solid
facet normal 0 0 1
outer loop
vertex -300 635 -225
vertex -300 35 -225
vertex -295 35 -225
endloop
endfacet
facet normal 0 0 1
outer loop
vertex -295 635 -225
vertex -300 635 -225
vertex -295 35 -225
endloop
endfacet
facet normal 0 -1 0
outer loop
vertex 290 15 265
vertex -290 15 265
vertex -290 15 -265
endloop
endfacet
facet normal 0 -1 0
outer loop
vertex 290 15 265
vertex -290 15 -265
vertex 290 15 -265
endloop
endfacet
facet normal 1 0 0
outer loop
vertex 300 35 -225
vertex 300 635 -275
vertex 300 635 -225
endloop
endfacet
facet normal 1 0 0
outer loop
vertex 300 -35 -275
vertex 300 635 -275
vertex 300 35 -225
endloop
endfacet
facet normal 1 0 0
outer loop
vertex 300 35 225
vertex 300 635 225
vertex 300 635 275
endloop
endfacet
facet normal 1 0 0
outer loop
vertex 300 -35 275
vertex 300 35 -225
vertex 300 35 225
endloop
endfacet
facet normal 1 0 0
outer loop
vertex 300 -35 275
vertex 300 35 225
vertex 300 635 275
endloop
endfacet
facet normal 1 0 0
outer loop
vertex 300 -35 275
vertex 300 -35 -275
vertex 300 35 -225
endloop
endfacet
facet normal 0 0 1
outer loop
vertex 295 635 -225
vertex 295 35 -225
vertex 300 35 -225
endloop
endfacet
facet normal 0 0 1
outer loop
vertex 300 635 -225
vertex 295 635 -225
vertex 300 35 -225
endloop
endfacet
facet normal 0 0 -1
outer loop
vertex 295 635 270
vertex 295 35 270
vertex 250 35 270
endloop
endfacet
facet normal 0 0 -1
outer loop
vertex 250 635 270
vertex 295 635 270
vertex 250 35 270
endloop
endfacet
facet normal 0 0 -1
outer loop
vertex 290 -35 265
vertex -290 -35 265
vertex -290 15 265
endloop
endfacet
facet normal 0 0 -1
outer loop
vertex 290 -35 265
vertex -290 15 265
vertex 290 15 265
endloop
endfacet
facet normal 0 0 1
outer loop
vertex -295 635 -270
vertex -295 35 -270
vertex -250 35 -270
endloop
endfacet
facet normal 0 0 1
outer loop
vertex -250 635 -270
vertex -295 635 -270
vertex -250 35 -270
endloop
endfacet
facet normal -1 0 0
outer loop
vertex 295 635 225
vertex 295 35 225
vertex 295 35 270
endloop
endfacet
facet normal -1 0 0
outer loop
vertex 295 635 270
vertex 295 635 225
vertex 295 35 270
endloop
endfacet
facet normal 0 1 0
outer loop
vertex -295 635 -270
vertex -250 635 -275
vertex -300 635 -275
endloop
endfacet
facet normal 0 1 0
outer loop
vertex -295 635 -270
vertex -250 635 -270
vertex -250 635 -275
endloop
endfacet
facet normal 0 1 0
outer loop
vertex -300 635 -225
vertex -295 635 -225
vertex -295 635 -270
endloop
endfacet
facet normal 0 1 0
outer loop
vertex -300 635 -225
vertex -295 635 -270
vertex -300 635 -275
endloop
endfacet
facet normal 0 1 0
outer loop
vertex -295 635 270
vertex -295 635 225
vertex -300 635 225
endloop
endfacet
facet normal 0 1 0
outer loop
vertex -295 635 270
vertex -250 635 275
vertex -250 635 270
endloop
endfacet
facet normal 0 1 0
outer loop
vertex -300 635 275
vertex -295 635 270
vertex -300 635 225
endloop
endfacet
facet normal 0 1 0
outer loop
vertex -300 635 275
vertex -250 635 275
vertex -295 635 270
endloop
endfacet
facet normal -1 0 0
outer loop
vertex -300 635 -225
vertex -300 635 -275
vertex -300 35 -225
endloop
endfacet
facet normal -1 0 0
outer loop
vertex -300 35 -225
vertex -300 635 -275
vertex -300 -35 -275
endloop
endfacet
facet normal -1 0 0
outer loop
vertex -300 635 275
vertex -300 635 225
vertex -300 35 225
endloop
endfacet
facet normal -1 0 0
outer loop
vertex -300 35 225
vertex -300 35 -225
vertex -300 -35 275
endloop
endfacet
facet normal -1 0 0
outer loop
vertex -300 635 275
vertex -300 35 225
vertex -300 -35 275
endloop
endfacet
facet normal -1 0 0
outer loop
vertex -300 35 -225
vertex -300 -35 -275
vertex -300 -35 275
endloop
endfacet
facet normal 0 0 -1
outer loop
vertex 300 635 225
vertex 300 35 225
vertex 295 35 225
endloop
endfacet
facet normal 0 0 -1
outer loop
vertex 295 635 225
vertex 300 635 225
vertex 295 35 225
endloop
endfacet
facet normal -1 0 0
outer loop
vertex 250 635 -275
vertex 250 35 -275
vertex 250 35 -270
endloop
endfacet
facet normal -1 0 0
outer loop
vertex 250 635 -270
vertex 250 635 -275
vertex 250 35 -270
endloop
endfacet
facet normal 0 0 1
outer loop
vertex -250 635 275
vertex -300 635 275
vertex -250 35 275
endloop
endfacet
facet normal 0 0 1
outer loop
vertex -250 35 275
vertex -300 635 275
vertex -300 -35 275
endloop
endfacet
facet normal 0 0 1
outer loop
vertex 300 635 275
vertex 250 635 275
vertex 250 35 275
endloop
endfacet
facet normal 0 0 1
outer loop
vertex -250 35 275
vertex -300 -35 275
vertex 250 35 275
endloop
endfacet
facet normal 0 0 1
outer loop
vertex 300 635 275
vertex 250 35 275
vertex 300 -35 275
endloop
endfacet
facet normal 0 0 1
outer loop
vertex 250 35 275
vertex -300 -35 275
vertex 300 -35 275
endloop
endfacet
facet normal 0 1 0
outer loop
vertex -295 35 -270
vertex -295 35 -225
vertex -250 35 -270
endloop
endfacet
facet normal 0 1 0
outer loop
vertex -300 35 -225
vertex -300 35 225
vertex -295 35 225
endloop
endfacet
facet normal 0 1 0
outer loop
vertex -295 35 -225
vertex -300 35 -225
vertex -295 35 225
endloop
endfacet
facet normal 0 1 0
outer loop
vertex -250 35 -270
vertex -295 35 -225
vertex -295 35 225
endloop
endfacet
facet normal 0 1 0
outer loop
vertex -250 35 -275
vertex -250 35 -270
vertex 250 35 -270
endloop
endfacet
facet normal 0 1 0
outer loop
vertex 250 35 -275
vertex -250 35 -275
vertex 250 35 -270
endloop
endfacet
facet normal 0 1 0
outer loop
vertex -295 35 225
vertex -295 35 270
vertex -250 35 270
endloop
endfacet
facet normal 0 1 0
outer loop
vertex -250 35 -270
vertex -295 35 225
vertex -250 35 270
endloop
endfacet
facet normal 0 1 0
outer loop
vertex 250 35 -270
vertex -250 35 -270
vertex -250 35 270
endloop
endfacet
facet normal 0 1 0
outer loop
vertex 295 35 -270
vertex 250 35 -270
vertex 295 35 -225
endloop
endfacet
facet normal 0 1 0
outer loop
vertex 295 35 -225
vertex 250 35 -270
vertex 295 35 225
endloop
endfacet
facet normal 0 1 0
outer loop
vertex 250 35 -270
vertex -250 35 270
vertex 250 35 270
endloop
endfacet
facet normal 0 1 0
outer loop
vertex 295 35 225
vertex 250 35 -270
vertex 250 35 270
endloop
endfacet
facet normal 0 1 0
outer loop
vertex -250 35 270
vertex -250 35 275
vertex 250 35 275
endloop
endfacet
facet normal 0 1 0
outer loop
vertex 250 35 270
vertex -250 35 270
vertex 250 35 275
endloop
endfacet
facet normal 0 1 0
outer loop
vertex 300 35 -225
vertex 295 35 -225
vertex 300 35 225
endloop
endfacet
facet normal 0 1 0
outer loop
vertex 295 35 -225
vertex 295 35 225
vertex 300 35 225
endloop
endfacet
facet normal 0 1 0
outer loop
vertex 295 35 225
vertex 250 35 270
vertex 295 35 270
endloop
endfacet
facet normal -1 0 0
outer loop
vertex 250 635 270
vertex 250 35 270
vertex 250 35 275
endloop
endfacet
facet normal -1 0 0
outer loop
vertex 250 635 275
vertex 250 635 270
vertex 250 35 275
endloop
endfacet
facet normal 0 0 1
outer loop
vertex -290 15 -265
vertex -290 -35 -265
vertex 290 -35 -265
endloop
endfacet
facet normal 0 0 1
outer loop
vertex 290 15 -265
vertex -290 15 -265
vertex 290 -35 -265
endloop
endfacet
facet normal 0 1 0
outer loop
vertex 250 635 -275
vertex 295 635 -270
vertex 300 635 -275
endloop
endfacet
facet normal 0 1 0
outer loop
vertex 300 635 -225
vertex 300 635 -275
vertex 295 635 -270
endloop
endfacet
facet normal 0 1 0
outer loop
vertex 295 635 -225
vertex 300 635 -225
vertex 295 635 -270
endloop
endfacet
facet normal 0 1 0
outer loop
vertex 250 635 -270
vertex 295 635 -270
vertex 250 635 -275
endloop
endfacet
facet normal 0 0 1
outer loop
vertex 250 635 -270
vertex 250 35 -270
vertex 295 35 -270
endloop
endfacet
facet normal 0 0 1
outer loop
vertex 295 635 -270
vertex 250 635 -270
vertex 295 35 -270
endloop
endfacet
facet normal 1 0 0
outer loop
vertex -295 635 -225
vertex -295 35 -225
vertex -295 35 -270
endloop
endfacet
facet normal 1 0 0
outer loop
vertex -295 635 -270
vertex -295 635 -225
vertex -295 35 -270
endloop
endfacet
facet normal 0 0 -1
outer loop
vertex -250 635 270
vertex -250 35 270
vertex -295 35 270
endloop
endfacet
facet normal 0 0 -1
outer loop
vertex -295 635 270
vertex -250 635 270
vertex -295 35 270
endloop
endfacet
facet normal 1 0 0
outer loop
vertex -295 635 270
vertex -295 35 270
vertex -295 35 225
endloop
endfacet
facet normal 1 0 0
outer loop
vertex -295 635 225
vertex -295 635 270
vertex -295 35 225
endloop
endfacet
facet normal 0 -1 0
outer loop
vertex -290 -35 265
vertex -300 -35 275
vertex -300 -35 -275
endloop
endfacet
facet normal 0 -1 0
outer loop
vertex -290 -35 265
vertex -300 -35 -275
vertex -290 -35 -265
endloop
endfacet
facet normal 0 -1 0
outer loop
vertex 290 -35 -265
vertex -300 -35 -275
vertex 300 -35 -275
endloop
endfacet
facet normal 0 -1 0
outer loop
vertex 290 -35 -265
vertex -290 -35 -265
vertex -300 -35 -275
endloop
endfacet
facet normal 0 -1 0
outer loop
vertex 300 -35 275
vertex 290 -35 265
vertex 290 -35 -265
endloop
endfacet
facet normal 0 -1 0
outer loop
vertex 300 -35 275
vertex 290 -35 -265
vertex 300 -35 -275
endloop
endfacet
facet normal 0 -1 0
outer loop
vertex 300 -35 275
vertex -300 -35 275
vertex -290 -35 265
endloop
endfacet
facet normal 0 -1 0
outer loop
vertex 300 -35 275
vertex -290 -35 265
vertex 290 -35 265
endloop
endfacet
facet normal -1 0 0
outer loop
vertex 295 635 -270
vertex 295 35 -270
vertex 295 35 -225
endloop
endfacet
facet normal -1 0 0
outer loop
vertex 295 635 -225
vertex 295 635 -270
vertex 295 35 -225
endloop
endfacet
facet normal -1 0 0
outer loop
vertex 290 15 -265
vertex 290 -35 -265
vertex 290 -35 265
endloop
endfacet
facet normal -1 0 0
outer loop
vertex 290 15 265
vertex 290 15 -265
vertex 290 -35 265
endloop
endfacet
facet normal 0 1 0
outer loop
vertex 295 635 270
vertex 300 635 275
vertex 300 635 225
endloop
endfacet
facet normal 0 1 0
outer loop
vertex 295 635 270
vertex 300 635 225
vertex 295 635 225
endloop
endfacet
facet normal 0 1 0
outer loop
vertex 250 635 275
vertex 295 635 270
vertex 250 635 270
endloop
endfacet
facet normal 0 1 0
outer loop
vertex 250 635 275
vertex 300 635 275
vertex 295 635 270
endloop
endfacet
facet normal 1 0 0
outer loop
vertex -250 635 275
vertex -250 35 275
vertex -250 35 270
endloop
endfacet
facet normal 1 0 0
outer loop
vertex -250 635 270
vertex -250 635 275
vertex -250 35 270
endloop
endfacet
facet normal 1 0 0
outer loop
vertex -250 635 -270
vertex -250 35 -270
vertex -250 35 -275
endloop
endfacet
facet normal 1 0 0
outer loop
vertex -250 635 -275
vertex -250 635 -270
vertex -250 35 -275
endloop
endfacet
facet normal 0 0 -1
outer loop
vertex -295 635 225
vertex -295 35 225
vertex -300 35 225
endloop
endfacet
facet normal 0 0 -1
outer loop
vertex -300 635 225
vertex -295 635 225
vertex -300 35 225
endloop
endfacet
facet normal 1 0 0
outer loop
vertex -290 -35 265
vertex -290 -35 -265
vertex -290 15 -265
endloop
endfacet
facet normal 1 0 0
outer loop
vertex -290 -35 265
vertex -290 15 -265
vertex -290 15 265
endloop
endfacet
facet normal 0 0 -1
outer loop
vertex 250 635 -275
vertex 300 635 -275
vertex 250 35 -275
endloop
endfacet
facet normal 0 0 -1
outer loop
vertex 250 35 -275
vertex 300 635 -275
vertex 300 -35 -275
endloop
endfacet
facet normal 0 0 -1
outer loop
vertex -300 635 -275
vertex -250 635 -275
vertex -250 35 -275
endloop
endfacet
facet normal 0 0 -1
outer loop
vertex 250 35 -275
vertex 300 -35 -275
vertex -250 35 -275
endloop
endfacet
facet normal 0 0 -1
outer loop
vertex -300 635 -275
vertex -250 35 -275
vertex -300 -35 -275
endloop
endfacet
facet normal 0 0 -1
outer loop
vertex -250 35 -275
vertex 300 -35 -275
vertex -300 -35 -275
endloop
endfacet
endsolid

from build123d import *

# Parameters (mm, degrees)
F0_W     = 600
F0_H     = 550
F1_DEPTH = 35
F3_DEPTH = 600
F4_W     = 580
F4_H     = 530
F5_DEPTH = 50


with BuildPart() as f1:
    # F0 (on Front) → F1 (new body, symmetric)
    with BuildSketch(Plane.XZ):
        Rectangle(F0_W, F0_H)
    extrude(amount=F1_DEPTH, both=True)

    # F2 (on face) → F3 (join)
    with BuildSketch(Plane(origin=(0, 35, 0), x_dir=(-1, 0, 0), z_dir=(0, 1, 0))):
        Polygon((250, -275), (300, -275), (300, -225), (295, -225), (295, -270), (250, -270), align=None)
        Polygon((-300, -275), (-250, -275), (-250, -270), (-295, -270), (-295, -225), (-300, -225), align=None)
        Polygon((-250, 270), (-250, 275), (-300, 275), (-300, 225), (-295, 225), (-295, 270), align=None)
        Polygon((295, 225), (300, 225), (300, 275), (250, 275), (250, 270), (295, 270), align=None)
    extrude(amount=F3_DEPTH)

    # F4 (on face) → F5 (cut)
    with BuildSketch(Plane.XZ.offset(35)):
        Rectangle(F4_W, F4_H)
    extrude(amount=-F5_DEPTH, mode=Mode.SUBTRACT)


solid = f1.part
